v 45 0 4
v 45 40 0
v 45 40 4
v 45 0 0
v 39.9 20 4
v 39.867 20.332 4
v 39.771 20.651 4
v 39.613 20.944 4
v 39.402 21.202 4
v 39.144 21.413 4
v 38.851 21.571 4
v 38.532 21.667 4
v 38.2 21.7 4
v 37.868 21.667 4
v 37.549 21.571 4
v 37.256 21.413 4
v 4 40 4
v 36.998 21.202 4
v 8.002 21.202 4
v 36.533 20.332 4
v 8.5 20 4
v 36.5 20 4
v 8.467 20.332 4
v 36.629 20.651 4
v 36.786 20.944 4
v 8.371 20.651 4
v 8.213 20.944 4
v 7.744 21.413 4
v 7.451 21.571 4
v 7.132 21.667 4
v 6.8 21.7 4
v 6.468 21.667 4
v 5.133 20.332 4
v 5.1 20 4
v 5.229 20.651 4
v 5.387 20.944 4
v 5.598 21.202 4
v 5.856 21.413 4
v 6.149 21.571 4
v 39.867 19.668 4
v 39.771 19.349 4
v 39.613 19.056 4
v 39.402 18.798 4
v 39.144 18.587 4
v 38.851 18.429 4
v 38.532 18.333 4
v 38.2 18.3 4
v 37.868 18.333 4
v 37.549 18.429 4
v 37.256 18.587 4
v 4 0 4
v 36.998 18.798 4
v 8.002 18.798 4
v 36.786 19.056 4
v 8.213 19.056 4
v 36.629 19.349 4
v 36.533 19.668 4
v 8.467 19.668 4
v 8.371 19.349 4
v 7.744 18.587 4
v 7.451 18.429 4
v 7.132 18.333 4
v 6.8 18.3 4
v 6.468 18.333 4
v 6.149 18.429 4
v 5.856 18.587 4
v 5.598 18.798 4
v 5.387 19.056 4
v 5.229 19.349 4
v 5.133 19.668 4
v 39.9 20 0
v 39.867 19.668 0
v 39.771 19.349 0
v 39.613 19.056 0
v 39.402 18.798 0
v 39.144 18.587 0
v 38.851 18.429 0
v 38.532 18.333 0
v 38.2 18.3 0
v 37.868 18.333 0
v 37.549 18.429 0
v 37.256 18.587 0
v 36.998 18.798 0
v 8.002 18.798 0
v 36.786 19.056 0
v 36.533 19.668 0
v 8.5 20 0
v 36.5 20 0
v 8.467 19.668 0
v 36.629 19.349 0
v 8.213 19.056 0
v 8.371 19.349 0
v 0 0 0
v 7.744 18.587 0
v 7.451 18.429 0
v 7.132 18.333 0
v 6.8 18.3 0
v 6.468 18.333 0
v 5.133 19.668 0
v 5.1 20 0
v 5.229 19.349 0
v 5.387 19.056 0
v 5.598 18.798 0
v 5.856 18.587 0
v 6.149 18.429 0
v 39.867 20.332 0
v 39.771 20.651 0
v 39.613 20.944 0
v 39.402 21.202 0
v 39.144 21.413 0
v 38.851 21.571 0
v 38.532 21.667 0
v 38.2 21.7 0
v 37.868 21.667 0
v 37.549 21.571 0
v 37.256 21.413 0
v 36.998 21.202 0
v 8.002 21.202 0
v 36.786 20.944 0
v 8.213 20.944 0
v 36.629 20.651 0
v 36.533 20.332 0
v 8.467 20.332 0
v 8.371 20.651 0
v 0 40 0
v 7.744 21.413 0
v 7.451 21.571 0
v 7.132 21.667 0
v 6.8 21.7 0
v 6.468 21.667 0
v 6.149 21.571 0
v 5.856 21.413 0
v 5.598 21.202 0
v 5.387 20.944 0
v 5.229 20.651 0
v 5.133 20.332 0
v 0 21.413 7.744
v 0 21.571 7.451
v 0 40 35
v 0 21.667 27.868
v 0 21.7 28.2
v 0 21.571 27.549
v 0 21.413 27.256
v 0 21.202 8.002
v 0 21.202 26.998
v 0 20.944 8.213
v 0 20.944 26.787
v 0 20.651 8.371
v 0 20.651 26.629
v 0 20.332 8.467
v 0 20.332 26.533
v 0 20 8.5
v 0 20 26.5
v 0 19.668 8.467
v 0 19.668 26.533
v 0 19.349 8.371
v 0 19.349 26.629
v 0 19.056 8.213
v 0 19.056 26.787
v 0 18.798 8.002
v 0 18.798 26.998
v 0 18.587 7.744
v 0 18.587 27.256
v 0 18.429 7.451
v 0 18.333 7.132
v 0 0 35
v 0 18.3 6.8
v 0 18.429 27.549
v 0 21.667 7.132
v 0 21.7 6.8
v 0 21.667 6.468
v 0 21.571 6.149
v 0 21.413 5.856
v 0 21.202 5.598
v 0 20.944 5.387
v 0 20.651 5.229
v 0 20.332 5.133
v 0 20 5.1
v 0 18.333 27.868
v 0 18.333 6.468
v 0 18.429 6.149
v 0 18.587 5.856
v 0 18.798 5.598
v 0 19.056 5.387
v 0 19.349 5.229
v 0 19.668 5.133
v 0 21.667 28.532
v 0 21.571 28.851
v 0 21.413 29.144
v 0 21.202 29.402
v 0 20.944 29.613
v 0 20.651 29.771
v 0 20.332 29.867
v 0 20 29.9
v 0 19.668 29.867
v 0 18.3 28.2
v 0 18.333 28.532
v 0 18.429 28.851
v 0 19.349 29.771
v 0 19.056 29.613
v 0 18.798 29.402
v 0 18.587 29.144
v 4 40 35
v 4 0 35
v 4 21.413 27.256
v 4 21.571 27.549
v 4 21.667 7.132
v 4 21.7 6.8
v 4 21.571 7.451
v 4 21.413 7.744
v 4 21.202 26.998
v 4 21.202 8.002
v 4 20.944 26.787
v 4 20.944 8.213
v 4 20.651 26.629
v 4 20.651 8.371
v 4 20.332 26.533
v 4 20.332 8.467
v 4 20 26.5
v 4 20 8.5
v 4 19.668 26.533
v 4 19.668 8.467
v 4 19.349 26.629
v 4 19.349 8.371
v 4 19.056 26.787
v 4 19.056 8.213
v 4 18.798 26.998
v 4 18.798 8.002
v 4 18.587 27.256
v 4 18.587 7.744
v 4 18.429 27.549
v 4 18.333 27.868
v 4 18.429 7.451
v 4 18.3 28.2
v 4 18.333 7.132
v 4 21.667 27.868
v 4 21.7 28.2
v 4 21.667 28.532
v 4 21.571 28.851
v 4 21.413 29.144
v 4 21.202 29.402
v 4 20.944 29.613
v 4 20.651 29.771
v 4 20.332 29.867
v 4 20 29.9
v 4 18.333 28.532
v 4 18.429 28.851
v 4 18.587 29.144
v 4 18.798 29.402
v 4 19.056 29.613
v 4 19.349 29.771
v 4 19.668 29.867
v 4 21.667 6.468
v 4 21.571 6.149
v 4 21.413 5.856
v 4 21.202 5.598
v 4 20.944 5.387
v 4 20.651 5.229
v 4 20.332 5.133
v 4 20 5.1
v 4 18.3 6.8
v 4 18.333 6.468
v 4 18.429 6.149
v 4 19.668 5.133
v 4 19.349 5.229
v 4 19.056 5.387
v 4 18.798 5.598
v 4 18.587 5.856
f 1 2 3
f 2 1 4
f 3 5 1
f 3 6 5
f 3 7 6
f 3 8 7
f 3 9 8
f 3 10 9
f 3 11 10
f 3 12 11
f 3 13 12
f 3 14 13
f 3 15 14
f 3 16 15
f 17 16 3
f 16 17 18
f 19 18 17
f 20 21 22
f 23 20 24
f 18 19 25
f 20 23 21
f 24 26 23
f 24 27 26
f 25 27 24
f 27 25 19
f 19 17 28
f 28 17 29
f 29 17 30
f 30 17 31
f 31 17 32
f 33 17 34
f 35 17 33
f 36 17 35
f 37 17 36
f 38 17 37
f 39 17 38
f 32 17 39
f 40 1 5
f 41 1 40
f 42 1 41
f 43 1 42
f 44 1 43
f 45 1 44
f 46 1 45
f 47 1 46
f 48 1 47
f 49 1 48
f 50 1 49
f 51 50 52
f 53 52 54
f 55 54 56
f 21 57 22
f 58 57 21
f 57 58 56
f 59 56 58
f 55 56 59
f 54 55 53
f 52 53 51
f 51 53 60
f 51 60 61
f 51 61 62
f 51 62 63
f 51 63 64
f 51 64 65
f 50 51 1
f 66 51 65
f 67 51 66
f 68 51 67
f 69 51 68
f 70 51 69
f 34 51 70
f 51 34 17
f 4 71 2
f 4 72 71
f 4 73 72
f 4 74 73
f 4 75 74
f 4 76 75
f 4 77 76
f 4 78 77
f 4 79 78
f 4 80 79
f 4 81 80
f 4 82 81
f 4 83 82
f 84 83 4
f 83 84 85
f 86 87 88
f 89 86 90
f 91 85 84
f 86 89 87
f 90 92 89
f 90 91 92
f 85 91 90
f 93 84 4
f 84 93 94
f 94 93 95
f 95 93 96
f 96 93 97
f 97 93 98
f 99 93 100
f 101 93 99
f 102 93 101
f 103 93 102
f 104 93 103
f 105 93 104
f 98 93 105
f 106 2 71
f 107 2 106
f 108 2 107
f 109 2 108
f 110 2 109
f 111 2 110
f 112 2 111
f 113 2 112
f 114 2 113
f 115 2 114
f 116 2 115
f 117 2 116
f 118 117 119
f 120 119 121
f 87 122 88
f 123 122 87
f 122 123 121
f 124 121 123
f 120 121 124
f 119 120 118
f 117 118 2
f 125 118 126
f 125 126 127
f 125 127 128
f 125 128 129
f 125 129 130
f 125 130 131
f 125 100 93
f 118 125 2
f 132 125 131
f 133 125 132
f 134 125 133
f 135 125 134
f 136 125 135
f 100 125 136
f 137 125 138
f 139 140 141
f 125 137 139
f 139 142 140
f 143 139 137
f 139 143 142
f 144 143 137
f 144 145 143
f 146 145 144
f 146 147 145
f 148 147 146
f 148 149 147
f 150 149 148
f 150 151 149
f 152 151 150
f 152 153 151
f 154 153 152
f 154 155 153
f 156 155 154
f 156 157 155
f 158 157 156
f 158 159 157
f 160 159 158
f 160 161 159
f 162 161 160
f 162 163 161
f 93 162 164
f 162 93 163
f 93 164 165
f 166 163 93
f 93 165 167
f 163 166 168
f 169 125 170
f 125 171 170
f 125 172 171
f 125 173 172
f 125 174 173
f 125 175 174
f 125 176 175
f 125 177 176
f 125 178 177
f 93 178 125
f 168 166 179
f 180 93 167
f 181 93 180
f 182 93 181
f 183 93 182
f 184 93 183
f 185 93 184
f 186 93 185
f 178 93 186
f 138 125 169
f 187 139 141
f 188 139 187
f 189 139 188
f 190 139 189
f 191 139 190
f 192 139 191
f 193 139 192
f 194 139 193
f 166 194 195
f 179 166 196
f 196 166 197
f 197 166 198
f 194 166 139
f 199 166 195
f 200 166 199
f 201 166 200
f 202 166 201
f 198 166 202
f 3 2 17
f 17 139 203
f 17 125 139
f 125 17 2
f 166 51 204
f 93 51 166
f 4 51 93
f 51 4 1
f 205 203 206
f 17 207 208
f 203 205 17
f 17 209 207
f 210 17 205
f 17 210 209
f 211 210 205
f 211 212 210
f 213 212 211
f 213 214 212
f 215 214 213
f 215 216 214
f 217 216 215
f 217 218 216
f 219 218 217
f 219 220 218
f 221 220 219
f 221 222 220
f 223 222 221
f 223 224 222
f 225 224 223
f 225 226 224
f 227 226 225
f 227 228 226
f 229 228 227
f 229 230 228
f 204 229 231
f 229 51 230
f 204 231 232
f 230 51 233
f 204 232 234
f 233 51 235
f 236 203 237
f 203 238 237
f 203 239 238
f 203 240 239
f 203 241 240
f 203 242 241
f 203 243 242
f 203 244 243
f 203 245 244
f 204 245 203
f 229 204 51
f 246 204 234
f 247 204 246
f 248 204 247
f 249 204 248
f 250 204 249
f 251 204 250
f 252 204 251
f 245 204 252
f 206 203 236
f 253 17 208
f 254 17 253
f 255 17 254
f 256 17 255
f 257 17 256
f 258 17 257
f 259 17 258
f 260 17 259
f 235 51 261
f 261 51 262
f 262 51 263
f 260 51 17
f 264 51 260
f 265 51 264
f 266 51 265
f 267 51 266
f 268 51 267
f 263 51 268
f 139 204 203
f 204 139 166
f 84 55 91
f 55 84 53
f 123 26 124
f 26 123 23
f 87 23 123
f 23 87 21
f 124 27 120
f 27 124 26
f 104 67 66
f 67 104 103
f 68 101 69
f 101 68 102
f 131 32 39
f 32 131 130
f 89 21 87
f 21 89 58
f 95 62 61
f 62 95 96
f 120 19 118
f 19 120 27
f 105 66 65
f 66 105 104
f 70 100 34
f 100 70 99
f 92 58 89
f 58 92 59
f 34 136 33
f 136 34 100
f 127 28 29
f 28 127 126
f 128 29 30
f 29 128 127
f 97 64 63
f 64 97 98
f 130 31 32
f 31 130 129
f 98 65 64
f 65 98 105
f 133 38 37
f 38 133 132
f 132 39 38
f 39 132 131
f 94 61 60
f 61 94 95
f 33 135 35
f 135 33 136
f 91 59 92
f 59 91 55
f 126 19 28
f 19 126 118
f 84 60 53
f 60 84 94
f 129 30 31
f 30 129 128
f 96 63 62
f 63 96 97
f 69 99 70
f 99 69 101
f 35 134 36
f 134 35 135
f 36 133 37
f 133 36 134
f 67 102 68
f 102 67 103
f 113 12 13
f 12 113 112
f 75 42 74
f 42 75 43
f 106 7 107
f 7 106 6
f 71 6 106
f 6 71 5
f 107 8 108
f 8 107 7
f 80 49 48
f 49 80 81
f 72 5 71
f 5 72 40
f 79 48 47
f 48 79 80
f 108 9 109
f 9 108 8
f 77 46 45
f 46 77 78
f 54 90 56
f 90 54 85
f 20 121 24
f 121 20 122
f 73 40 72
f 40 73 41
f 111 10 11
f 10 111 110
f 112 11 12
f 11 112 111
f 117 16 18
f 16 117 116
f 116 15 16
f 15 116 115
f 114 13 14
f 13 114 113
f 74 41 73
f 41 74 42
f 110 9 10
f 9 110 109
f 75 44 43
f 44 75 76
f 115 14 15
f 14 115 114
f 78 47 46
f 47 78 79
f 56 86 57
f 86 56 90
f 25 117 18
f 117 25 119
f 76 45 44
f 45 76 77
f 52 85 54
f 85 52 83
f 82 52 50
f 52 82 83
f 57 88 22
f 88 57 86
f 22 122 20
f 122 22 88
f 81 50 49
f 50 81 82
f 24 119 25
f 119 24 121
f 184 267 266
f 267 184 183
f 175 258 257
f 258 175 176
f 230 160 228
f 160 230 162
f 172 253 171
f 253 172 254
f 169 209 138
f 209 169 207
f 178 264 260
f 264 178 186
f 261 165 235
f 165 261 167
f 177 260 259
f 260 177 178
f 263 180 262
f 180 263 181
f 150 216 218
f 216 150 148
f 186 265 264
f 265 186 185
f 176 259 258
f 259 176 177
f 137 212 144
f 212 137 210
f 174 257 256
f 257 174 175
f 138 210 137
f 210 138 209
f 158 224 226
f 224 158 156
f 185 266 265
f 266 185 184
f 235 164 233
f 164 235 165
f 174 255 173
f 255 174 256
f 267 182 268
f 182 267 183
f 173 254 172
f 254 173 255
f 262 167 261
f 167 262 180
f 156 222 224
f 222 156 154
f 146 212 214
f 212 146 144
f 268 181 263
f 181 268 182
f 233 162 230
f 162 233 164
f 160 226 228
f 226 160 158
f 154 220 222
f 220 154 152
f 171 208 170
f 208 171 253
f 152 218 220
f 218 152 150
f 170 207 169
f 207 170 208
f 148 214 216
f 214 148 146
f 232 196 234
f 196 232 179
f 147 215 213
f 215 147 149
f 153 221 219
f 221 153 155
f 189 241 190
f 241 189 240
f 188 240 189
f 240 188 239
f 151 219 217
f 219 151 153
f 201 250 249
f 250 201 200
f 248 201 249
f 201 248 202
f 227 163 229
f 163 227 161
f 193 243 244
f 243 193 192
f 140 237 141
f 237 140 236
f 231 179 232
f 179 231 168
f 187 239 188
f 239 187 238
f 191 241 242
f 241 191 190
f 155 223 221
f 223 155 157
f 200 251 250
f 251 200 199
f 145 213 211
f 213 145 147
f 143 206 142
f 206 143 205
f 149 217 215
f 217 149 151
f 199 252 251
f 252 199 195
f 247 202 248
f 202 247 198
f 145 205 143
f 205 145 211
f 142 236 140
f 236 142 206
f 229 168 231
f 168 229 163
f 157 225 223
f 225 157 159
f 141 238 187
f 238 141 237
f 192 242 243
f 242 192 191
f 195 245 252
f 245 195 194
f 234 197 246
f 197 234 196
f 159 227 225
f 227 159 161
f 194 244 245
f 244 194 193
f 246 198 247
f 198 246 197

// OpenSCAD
$fn = 32;

// ----------------------------------------------------------------------
// L-bracket: 45 x 40 x 35 mm
// ----------------------------------------------------------------------

// --- parameters (mm) ---
arm_x = 45;               // horizontal leg, X
arm_z = 35;               // vertical leg, Z
width = 40;               // bracket depth, Y
wall = 4;                 // plate thickness
hole_d = 3.4;             // clearance for M3

module hole_z(px, py) {
  translate([px, py, -0.5]) cylinder(h = wall + 1, d = hole_d);
}
module hole_x(pz, py) {
  translate([-0.5, py, pz]) rotate([0, 90, 0]) cylinder(h = wall + 1, d = hole_d);
}

difference() {
  union() {
    /* horizontal leg */
    cube([arm_x, width, wall]);
    /* vertical leg, overlapping the corner block */
    cube([wall, width, arm_z]);
  }
  hole_z(6.8, 20);
  hole_z(38.2, 20);
  hole_x(6.8, 20);
  hole_x(28.2, 20);
}
